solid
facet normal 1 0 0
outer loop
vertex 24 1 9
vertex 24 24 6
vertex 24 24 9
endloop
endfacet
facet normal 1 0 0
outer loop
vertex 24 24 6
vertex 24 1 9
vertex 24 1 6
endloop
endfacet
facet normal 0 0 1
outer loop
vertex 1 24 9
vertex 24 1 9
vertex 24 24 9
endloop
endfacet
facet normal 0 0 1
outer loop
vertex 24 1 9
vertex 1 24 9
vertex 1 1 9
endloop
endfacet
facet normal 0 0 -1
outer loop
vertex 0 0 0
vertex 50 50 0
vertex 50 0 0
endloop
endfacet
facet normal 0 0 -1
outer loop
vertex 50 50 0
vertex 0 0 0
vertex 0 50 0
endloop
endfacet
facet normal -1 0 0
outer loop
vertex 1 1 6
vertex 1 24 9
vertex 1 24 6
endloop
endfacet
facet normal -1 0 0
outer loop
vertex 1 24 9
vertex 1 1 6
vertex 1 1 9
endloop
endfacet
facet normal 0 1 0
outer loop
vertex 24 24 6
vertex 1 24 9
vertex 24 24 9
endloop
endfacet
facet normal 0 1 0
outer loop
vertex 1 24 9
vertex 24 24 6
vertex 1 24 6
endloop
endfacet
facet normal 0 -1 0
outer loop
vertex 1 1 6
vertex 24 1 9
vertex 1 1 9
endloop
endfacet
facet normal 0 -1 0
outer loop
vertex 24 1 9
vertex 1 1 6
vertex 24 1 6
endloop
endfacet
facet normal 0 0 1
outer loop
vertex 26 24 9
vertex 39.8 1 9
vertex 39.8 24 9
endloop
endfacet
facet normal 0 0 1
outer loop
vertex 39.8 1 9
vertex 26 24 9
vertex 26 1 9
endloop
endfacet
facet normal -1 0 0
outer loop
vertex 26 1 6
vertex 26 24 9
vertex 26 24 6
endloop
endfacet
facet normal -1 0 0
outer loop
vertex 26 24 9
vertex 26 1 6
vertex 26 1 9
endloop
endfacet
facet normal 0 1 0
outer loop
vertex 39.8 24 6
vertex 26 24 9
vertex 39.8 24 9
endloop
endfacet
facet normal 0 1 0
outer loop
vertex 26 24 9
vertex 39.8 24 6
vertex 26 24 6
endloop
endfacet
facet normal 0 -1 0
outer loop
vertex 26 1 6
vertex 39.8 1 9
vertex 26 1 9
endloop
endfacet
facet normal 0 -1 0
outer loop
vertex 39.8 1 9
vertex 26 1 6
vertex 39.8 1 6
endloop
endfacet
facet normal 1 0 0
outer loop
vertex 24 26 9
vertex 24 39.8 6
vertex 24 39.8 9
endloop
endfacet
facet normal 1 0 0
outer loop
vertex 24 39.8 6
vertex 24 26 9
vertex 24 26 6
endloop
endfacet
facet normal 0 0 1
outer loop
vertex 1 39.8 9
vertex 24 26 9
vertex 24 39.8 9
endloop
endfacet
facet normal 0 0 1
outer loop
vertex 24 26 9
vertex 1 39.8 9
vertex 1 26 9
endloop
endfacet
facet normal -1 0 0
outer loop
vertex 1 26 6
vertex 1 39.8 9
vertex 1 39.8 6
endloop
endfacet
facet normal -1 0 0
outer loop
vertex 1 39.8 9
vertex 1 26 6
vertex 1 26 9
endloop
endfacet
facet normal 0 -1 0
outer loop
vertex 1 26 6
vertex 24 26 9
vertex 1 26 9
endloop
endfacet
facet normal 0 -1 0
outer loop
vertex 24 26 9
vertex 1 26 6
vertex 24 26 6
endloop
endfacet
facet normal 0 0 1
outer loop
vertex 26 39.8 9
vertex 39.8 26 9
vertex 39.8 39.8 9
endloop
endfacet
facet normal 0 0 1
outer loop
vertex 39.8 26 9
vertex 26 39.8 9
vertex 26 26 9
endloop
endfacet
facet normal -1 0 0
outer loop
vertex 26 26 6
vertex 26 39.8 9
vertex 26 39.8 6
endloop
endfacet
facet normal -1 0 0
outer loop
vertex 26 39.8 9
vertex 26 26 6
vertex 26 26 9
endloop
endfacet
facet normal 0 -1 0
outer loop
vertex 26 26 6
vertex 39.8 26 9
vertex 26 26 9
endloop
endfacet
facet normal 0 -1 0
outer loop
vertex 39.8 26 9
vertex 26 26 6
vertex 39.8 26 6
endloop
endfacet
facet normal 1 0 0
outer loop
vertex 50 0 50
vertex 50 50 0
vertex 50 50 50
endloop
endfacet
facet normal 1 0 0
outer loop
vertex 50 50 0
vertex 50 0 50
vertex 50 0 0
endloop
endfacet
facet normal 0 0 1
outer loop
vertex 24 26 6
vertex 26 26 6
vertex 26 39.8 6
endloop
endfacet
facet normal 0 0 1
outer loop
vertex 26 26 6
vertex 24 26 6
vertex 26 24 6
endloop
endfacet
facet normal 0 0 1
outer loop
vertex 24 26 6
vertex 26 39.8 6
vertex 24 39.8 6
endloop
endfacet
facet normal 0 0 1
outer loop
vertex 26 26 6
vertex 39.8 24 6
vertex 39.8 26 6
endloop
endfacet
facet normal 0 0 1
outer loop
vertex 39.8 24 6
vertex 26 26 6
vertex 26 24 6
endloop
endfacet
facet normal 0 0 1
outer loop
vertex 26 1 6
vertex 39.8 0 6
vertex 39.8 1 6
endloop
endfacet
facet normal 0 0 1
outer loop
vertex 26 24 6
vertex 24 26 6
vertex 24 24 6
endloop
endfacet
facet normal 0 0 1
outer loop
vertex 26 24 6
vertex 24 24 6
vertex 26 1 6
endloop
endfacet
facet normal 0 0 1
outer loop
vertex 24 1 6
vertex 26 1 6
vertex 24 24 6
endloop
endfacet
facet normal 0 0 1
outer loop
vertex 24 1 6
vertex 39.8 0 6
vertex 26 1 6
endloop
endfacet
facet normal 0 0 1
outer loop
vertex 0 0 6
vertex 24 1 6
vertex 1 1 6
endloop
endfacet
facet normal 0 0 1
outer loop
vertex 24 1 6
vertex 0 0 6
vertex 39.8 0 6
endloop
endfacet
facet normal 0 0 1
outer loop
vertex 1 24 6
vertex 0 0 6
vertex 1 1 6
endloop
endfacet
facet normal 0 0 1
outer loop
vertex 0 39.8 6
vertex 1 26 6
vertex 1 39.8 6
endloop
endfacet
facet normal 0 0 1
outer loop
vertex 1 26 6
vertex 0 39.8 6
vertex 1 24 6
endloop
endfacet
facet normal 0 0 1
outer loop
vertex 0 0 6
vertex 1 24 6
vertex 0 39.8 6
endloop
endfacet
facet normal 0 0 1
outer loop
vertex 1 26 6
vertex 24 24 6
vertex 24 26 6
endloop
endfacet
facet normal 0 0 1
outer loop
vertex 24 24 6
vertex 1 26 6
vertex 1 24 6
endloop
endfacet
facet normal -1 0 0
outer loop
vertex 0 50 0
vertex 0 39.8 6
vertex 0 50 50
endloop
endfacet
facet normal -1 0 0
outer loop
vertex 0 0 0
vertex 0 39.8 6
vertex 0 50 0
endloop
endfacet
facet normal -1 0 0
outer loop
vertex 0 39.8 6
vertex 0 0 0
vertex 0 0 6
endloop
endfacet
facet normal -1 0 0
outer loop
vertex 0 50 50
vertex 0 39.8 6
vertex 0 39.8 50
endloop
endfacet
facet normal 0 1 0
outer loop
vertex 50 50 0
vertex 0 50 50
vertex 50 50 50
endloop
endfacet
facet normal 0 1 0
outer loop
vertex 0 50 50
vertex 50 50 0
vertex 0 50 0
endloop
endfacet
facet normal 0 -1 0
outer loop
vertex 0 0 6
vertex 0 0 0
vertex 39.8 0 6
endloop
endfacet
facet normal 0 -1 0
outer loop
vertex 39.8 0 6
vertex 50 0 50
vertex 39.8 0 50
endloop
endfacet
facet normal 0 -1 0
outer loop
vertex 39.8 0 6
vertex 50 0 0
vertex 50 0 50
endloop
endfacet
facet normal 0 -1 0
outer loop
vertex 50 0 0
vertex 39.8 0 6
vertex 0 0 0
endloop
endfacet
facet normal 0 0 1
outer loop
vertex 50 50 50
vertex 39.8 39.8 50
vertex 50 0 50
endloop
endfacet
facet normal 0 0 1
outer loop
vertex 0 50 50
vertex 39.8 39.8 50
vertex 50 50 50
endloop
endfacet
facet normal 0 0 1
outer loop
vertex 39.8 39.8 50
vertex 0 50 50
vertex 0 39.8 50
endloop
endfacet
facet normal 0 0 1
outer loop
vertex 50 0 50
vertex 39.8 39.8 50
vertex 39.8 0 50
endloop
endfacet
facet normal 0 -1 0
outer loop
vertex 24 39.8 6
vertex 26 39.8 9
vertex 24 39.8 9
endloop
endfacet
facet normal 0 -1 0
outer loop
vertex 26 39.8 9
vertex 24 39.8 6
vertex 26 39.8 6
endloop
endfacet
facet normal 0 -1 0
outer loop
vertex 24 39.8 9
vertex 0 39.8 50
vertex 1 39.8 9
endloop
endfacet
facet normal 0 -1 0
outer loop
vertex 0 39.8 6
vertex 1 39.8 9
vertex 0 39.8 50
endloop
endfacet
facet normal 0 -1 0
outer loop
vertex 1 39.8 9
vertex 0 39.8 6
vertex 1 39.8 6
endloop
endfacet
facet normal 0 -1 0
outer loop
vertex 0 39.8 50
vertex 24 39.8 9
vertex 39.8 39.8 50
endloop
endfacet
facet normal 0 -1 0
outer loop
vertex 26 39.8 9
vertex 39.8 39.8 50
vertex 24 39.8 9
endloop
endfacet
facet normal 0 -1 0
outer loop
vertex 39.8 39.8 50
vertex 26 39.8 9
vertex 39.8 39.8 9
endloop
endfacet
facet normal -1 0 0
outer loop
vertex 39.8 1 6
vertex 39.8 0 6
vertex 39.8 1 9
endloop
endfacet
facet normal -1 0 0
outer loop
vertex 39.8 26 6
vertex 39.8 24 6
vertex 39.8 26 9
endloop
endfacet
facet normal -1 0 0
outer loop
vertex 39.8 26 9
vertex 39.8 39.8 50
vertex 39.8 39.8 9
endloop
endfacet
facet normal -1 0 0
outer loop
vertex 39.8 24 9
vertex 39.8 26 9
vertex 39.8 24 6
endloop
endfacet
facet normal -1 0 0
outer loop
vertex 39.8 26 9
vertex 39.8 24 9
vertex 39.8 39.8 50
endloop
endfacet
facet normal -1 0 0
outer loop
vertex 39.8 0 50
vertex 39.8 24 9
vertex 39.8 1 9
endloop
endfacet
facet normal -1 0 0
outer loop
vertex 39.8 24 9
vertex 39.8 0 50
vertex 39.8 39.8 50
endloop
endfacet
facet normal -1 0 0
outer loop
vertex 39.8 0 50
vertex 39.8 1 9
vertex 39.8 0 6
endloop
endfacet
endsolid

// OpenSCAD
//translate([0,0,0]) color("LightGray") square([25,25],false);
//translate([25,0,0]) color("LightGray") square([25,25],false);
//translate([0,25,0]) color("LightGray") square([25,25],false);
//translate([25,25,0]) color("LightGray") square([25,25],false);

scale([2,2,2]) {
    //translate([0,50,0]) color("Gray") square([50,12.5],false);
    //translate([50,0,0]) color("Gray") square([12.5,50],false);
}

color("LightGray") {
    translate([1,1,0]) cube([23,23,9]);
    translate([25+1,1,0]) cube([23,23,9]);
    translate([1,25+1,0]) cube([23,23,9]);
    translate([25+1,25+1,0]) cube([23,23,9]);
}
color("Grey") {
    cube([50,50,6]);
    translate([0,50-10.2,0]) cube([50,10.2,50]);
    translate([50-10.2,0,0]) cube([10.2,50,50]);
}
